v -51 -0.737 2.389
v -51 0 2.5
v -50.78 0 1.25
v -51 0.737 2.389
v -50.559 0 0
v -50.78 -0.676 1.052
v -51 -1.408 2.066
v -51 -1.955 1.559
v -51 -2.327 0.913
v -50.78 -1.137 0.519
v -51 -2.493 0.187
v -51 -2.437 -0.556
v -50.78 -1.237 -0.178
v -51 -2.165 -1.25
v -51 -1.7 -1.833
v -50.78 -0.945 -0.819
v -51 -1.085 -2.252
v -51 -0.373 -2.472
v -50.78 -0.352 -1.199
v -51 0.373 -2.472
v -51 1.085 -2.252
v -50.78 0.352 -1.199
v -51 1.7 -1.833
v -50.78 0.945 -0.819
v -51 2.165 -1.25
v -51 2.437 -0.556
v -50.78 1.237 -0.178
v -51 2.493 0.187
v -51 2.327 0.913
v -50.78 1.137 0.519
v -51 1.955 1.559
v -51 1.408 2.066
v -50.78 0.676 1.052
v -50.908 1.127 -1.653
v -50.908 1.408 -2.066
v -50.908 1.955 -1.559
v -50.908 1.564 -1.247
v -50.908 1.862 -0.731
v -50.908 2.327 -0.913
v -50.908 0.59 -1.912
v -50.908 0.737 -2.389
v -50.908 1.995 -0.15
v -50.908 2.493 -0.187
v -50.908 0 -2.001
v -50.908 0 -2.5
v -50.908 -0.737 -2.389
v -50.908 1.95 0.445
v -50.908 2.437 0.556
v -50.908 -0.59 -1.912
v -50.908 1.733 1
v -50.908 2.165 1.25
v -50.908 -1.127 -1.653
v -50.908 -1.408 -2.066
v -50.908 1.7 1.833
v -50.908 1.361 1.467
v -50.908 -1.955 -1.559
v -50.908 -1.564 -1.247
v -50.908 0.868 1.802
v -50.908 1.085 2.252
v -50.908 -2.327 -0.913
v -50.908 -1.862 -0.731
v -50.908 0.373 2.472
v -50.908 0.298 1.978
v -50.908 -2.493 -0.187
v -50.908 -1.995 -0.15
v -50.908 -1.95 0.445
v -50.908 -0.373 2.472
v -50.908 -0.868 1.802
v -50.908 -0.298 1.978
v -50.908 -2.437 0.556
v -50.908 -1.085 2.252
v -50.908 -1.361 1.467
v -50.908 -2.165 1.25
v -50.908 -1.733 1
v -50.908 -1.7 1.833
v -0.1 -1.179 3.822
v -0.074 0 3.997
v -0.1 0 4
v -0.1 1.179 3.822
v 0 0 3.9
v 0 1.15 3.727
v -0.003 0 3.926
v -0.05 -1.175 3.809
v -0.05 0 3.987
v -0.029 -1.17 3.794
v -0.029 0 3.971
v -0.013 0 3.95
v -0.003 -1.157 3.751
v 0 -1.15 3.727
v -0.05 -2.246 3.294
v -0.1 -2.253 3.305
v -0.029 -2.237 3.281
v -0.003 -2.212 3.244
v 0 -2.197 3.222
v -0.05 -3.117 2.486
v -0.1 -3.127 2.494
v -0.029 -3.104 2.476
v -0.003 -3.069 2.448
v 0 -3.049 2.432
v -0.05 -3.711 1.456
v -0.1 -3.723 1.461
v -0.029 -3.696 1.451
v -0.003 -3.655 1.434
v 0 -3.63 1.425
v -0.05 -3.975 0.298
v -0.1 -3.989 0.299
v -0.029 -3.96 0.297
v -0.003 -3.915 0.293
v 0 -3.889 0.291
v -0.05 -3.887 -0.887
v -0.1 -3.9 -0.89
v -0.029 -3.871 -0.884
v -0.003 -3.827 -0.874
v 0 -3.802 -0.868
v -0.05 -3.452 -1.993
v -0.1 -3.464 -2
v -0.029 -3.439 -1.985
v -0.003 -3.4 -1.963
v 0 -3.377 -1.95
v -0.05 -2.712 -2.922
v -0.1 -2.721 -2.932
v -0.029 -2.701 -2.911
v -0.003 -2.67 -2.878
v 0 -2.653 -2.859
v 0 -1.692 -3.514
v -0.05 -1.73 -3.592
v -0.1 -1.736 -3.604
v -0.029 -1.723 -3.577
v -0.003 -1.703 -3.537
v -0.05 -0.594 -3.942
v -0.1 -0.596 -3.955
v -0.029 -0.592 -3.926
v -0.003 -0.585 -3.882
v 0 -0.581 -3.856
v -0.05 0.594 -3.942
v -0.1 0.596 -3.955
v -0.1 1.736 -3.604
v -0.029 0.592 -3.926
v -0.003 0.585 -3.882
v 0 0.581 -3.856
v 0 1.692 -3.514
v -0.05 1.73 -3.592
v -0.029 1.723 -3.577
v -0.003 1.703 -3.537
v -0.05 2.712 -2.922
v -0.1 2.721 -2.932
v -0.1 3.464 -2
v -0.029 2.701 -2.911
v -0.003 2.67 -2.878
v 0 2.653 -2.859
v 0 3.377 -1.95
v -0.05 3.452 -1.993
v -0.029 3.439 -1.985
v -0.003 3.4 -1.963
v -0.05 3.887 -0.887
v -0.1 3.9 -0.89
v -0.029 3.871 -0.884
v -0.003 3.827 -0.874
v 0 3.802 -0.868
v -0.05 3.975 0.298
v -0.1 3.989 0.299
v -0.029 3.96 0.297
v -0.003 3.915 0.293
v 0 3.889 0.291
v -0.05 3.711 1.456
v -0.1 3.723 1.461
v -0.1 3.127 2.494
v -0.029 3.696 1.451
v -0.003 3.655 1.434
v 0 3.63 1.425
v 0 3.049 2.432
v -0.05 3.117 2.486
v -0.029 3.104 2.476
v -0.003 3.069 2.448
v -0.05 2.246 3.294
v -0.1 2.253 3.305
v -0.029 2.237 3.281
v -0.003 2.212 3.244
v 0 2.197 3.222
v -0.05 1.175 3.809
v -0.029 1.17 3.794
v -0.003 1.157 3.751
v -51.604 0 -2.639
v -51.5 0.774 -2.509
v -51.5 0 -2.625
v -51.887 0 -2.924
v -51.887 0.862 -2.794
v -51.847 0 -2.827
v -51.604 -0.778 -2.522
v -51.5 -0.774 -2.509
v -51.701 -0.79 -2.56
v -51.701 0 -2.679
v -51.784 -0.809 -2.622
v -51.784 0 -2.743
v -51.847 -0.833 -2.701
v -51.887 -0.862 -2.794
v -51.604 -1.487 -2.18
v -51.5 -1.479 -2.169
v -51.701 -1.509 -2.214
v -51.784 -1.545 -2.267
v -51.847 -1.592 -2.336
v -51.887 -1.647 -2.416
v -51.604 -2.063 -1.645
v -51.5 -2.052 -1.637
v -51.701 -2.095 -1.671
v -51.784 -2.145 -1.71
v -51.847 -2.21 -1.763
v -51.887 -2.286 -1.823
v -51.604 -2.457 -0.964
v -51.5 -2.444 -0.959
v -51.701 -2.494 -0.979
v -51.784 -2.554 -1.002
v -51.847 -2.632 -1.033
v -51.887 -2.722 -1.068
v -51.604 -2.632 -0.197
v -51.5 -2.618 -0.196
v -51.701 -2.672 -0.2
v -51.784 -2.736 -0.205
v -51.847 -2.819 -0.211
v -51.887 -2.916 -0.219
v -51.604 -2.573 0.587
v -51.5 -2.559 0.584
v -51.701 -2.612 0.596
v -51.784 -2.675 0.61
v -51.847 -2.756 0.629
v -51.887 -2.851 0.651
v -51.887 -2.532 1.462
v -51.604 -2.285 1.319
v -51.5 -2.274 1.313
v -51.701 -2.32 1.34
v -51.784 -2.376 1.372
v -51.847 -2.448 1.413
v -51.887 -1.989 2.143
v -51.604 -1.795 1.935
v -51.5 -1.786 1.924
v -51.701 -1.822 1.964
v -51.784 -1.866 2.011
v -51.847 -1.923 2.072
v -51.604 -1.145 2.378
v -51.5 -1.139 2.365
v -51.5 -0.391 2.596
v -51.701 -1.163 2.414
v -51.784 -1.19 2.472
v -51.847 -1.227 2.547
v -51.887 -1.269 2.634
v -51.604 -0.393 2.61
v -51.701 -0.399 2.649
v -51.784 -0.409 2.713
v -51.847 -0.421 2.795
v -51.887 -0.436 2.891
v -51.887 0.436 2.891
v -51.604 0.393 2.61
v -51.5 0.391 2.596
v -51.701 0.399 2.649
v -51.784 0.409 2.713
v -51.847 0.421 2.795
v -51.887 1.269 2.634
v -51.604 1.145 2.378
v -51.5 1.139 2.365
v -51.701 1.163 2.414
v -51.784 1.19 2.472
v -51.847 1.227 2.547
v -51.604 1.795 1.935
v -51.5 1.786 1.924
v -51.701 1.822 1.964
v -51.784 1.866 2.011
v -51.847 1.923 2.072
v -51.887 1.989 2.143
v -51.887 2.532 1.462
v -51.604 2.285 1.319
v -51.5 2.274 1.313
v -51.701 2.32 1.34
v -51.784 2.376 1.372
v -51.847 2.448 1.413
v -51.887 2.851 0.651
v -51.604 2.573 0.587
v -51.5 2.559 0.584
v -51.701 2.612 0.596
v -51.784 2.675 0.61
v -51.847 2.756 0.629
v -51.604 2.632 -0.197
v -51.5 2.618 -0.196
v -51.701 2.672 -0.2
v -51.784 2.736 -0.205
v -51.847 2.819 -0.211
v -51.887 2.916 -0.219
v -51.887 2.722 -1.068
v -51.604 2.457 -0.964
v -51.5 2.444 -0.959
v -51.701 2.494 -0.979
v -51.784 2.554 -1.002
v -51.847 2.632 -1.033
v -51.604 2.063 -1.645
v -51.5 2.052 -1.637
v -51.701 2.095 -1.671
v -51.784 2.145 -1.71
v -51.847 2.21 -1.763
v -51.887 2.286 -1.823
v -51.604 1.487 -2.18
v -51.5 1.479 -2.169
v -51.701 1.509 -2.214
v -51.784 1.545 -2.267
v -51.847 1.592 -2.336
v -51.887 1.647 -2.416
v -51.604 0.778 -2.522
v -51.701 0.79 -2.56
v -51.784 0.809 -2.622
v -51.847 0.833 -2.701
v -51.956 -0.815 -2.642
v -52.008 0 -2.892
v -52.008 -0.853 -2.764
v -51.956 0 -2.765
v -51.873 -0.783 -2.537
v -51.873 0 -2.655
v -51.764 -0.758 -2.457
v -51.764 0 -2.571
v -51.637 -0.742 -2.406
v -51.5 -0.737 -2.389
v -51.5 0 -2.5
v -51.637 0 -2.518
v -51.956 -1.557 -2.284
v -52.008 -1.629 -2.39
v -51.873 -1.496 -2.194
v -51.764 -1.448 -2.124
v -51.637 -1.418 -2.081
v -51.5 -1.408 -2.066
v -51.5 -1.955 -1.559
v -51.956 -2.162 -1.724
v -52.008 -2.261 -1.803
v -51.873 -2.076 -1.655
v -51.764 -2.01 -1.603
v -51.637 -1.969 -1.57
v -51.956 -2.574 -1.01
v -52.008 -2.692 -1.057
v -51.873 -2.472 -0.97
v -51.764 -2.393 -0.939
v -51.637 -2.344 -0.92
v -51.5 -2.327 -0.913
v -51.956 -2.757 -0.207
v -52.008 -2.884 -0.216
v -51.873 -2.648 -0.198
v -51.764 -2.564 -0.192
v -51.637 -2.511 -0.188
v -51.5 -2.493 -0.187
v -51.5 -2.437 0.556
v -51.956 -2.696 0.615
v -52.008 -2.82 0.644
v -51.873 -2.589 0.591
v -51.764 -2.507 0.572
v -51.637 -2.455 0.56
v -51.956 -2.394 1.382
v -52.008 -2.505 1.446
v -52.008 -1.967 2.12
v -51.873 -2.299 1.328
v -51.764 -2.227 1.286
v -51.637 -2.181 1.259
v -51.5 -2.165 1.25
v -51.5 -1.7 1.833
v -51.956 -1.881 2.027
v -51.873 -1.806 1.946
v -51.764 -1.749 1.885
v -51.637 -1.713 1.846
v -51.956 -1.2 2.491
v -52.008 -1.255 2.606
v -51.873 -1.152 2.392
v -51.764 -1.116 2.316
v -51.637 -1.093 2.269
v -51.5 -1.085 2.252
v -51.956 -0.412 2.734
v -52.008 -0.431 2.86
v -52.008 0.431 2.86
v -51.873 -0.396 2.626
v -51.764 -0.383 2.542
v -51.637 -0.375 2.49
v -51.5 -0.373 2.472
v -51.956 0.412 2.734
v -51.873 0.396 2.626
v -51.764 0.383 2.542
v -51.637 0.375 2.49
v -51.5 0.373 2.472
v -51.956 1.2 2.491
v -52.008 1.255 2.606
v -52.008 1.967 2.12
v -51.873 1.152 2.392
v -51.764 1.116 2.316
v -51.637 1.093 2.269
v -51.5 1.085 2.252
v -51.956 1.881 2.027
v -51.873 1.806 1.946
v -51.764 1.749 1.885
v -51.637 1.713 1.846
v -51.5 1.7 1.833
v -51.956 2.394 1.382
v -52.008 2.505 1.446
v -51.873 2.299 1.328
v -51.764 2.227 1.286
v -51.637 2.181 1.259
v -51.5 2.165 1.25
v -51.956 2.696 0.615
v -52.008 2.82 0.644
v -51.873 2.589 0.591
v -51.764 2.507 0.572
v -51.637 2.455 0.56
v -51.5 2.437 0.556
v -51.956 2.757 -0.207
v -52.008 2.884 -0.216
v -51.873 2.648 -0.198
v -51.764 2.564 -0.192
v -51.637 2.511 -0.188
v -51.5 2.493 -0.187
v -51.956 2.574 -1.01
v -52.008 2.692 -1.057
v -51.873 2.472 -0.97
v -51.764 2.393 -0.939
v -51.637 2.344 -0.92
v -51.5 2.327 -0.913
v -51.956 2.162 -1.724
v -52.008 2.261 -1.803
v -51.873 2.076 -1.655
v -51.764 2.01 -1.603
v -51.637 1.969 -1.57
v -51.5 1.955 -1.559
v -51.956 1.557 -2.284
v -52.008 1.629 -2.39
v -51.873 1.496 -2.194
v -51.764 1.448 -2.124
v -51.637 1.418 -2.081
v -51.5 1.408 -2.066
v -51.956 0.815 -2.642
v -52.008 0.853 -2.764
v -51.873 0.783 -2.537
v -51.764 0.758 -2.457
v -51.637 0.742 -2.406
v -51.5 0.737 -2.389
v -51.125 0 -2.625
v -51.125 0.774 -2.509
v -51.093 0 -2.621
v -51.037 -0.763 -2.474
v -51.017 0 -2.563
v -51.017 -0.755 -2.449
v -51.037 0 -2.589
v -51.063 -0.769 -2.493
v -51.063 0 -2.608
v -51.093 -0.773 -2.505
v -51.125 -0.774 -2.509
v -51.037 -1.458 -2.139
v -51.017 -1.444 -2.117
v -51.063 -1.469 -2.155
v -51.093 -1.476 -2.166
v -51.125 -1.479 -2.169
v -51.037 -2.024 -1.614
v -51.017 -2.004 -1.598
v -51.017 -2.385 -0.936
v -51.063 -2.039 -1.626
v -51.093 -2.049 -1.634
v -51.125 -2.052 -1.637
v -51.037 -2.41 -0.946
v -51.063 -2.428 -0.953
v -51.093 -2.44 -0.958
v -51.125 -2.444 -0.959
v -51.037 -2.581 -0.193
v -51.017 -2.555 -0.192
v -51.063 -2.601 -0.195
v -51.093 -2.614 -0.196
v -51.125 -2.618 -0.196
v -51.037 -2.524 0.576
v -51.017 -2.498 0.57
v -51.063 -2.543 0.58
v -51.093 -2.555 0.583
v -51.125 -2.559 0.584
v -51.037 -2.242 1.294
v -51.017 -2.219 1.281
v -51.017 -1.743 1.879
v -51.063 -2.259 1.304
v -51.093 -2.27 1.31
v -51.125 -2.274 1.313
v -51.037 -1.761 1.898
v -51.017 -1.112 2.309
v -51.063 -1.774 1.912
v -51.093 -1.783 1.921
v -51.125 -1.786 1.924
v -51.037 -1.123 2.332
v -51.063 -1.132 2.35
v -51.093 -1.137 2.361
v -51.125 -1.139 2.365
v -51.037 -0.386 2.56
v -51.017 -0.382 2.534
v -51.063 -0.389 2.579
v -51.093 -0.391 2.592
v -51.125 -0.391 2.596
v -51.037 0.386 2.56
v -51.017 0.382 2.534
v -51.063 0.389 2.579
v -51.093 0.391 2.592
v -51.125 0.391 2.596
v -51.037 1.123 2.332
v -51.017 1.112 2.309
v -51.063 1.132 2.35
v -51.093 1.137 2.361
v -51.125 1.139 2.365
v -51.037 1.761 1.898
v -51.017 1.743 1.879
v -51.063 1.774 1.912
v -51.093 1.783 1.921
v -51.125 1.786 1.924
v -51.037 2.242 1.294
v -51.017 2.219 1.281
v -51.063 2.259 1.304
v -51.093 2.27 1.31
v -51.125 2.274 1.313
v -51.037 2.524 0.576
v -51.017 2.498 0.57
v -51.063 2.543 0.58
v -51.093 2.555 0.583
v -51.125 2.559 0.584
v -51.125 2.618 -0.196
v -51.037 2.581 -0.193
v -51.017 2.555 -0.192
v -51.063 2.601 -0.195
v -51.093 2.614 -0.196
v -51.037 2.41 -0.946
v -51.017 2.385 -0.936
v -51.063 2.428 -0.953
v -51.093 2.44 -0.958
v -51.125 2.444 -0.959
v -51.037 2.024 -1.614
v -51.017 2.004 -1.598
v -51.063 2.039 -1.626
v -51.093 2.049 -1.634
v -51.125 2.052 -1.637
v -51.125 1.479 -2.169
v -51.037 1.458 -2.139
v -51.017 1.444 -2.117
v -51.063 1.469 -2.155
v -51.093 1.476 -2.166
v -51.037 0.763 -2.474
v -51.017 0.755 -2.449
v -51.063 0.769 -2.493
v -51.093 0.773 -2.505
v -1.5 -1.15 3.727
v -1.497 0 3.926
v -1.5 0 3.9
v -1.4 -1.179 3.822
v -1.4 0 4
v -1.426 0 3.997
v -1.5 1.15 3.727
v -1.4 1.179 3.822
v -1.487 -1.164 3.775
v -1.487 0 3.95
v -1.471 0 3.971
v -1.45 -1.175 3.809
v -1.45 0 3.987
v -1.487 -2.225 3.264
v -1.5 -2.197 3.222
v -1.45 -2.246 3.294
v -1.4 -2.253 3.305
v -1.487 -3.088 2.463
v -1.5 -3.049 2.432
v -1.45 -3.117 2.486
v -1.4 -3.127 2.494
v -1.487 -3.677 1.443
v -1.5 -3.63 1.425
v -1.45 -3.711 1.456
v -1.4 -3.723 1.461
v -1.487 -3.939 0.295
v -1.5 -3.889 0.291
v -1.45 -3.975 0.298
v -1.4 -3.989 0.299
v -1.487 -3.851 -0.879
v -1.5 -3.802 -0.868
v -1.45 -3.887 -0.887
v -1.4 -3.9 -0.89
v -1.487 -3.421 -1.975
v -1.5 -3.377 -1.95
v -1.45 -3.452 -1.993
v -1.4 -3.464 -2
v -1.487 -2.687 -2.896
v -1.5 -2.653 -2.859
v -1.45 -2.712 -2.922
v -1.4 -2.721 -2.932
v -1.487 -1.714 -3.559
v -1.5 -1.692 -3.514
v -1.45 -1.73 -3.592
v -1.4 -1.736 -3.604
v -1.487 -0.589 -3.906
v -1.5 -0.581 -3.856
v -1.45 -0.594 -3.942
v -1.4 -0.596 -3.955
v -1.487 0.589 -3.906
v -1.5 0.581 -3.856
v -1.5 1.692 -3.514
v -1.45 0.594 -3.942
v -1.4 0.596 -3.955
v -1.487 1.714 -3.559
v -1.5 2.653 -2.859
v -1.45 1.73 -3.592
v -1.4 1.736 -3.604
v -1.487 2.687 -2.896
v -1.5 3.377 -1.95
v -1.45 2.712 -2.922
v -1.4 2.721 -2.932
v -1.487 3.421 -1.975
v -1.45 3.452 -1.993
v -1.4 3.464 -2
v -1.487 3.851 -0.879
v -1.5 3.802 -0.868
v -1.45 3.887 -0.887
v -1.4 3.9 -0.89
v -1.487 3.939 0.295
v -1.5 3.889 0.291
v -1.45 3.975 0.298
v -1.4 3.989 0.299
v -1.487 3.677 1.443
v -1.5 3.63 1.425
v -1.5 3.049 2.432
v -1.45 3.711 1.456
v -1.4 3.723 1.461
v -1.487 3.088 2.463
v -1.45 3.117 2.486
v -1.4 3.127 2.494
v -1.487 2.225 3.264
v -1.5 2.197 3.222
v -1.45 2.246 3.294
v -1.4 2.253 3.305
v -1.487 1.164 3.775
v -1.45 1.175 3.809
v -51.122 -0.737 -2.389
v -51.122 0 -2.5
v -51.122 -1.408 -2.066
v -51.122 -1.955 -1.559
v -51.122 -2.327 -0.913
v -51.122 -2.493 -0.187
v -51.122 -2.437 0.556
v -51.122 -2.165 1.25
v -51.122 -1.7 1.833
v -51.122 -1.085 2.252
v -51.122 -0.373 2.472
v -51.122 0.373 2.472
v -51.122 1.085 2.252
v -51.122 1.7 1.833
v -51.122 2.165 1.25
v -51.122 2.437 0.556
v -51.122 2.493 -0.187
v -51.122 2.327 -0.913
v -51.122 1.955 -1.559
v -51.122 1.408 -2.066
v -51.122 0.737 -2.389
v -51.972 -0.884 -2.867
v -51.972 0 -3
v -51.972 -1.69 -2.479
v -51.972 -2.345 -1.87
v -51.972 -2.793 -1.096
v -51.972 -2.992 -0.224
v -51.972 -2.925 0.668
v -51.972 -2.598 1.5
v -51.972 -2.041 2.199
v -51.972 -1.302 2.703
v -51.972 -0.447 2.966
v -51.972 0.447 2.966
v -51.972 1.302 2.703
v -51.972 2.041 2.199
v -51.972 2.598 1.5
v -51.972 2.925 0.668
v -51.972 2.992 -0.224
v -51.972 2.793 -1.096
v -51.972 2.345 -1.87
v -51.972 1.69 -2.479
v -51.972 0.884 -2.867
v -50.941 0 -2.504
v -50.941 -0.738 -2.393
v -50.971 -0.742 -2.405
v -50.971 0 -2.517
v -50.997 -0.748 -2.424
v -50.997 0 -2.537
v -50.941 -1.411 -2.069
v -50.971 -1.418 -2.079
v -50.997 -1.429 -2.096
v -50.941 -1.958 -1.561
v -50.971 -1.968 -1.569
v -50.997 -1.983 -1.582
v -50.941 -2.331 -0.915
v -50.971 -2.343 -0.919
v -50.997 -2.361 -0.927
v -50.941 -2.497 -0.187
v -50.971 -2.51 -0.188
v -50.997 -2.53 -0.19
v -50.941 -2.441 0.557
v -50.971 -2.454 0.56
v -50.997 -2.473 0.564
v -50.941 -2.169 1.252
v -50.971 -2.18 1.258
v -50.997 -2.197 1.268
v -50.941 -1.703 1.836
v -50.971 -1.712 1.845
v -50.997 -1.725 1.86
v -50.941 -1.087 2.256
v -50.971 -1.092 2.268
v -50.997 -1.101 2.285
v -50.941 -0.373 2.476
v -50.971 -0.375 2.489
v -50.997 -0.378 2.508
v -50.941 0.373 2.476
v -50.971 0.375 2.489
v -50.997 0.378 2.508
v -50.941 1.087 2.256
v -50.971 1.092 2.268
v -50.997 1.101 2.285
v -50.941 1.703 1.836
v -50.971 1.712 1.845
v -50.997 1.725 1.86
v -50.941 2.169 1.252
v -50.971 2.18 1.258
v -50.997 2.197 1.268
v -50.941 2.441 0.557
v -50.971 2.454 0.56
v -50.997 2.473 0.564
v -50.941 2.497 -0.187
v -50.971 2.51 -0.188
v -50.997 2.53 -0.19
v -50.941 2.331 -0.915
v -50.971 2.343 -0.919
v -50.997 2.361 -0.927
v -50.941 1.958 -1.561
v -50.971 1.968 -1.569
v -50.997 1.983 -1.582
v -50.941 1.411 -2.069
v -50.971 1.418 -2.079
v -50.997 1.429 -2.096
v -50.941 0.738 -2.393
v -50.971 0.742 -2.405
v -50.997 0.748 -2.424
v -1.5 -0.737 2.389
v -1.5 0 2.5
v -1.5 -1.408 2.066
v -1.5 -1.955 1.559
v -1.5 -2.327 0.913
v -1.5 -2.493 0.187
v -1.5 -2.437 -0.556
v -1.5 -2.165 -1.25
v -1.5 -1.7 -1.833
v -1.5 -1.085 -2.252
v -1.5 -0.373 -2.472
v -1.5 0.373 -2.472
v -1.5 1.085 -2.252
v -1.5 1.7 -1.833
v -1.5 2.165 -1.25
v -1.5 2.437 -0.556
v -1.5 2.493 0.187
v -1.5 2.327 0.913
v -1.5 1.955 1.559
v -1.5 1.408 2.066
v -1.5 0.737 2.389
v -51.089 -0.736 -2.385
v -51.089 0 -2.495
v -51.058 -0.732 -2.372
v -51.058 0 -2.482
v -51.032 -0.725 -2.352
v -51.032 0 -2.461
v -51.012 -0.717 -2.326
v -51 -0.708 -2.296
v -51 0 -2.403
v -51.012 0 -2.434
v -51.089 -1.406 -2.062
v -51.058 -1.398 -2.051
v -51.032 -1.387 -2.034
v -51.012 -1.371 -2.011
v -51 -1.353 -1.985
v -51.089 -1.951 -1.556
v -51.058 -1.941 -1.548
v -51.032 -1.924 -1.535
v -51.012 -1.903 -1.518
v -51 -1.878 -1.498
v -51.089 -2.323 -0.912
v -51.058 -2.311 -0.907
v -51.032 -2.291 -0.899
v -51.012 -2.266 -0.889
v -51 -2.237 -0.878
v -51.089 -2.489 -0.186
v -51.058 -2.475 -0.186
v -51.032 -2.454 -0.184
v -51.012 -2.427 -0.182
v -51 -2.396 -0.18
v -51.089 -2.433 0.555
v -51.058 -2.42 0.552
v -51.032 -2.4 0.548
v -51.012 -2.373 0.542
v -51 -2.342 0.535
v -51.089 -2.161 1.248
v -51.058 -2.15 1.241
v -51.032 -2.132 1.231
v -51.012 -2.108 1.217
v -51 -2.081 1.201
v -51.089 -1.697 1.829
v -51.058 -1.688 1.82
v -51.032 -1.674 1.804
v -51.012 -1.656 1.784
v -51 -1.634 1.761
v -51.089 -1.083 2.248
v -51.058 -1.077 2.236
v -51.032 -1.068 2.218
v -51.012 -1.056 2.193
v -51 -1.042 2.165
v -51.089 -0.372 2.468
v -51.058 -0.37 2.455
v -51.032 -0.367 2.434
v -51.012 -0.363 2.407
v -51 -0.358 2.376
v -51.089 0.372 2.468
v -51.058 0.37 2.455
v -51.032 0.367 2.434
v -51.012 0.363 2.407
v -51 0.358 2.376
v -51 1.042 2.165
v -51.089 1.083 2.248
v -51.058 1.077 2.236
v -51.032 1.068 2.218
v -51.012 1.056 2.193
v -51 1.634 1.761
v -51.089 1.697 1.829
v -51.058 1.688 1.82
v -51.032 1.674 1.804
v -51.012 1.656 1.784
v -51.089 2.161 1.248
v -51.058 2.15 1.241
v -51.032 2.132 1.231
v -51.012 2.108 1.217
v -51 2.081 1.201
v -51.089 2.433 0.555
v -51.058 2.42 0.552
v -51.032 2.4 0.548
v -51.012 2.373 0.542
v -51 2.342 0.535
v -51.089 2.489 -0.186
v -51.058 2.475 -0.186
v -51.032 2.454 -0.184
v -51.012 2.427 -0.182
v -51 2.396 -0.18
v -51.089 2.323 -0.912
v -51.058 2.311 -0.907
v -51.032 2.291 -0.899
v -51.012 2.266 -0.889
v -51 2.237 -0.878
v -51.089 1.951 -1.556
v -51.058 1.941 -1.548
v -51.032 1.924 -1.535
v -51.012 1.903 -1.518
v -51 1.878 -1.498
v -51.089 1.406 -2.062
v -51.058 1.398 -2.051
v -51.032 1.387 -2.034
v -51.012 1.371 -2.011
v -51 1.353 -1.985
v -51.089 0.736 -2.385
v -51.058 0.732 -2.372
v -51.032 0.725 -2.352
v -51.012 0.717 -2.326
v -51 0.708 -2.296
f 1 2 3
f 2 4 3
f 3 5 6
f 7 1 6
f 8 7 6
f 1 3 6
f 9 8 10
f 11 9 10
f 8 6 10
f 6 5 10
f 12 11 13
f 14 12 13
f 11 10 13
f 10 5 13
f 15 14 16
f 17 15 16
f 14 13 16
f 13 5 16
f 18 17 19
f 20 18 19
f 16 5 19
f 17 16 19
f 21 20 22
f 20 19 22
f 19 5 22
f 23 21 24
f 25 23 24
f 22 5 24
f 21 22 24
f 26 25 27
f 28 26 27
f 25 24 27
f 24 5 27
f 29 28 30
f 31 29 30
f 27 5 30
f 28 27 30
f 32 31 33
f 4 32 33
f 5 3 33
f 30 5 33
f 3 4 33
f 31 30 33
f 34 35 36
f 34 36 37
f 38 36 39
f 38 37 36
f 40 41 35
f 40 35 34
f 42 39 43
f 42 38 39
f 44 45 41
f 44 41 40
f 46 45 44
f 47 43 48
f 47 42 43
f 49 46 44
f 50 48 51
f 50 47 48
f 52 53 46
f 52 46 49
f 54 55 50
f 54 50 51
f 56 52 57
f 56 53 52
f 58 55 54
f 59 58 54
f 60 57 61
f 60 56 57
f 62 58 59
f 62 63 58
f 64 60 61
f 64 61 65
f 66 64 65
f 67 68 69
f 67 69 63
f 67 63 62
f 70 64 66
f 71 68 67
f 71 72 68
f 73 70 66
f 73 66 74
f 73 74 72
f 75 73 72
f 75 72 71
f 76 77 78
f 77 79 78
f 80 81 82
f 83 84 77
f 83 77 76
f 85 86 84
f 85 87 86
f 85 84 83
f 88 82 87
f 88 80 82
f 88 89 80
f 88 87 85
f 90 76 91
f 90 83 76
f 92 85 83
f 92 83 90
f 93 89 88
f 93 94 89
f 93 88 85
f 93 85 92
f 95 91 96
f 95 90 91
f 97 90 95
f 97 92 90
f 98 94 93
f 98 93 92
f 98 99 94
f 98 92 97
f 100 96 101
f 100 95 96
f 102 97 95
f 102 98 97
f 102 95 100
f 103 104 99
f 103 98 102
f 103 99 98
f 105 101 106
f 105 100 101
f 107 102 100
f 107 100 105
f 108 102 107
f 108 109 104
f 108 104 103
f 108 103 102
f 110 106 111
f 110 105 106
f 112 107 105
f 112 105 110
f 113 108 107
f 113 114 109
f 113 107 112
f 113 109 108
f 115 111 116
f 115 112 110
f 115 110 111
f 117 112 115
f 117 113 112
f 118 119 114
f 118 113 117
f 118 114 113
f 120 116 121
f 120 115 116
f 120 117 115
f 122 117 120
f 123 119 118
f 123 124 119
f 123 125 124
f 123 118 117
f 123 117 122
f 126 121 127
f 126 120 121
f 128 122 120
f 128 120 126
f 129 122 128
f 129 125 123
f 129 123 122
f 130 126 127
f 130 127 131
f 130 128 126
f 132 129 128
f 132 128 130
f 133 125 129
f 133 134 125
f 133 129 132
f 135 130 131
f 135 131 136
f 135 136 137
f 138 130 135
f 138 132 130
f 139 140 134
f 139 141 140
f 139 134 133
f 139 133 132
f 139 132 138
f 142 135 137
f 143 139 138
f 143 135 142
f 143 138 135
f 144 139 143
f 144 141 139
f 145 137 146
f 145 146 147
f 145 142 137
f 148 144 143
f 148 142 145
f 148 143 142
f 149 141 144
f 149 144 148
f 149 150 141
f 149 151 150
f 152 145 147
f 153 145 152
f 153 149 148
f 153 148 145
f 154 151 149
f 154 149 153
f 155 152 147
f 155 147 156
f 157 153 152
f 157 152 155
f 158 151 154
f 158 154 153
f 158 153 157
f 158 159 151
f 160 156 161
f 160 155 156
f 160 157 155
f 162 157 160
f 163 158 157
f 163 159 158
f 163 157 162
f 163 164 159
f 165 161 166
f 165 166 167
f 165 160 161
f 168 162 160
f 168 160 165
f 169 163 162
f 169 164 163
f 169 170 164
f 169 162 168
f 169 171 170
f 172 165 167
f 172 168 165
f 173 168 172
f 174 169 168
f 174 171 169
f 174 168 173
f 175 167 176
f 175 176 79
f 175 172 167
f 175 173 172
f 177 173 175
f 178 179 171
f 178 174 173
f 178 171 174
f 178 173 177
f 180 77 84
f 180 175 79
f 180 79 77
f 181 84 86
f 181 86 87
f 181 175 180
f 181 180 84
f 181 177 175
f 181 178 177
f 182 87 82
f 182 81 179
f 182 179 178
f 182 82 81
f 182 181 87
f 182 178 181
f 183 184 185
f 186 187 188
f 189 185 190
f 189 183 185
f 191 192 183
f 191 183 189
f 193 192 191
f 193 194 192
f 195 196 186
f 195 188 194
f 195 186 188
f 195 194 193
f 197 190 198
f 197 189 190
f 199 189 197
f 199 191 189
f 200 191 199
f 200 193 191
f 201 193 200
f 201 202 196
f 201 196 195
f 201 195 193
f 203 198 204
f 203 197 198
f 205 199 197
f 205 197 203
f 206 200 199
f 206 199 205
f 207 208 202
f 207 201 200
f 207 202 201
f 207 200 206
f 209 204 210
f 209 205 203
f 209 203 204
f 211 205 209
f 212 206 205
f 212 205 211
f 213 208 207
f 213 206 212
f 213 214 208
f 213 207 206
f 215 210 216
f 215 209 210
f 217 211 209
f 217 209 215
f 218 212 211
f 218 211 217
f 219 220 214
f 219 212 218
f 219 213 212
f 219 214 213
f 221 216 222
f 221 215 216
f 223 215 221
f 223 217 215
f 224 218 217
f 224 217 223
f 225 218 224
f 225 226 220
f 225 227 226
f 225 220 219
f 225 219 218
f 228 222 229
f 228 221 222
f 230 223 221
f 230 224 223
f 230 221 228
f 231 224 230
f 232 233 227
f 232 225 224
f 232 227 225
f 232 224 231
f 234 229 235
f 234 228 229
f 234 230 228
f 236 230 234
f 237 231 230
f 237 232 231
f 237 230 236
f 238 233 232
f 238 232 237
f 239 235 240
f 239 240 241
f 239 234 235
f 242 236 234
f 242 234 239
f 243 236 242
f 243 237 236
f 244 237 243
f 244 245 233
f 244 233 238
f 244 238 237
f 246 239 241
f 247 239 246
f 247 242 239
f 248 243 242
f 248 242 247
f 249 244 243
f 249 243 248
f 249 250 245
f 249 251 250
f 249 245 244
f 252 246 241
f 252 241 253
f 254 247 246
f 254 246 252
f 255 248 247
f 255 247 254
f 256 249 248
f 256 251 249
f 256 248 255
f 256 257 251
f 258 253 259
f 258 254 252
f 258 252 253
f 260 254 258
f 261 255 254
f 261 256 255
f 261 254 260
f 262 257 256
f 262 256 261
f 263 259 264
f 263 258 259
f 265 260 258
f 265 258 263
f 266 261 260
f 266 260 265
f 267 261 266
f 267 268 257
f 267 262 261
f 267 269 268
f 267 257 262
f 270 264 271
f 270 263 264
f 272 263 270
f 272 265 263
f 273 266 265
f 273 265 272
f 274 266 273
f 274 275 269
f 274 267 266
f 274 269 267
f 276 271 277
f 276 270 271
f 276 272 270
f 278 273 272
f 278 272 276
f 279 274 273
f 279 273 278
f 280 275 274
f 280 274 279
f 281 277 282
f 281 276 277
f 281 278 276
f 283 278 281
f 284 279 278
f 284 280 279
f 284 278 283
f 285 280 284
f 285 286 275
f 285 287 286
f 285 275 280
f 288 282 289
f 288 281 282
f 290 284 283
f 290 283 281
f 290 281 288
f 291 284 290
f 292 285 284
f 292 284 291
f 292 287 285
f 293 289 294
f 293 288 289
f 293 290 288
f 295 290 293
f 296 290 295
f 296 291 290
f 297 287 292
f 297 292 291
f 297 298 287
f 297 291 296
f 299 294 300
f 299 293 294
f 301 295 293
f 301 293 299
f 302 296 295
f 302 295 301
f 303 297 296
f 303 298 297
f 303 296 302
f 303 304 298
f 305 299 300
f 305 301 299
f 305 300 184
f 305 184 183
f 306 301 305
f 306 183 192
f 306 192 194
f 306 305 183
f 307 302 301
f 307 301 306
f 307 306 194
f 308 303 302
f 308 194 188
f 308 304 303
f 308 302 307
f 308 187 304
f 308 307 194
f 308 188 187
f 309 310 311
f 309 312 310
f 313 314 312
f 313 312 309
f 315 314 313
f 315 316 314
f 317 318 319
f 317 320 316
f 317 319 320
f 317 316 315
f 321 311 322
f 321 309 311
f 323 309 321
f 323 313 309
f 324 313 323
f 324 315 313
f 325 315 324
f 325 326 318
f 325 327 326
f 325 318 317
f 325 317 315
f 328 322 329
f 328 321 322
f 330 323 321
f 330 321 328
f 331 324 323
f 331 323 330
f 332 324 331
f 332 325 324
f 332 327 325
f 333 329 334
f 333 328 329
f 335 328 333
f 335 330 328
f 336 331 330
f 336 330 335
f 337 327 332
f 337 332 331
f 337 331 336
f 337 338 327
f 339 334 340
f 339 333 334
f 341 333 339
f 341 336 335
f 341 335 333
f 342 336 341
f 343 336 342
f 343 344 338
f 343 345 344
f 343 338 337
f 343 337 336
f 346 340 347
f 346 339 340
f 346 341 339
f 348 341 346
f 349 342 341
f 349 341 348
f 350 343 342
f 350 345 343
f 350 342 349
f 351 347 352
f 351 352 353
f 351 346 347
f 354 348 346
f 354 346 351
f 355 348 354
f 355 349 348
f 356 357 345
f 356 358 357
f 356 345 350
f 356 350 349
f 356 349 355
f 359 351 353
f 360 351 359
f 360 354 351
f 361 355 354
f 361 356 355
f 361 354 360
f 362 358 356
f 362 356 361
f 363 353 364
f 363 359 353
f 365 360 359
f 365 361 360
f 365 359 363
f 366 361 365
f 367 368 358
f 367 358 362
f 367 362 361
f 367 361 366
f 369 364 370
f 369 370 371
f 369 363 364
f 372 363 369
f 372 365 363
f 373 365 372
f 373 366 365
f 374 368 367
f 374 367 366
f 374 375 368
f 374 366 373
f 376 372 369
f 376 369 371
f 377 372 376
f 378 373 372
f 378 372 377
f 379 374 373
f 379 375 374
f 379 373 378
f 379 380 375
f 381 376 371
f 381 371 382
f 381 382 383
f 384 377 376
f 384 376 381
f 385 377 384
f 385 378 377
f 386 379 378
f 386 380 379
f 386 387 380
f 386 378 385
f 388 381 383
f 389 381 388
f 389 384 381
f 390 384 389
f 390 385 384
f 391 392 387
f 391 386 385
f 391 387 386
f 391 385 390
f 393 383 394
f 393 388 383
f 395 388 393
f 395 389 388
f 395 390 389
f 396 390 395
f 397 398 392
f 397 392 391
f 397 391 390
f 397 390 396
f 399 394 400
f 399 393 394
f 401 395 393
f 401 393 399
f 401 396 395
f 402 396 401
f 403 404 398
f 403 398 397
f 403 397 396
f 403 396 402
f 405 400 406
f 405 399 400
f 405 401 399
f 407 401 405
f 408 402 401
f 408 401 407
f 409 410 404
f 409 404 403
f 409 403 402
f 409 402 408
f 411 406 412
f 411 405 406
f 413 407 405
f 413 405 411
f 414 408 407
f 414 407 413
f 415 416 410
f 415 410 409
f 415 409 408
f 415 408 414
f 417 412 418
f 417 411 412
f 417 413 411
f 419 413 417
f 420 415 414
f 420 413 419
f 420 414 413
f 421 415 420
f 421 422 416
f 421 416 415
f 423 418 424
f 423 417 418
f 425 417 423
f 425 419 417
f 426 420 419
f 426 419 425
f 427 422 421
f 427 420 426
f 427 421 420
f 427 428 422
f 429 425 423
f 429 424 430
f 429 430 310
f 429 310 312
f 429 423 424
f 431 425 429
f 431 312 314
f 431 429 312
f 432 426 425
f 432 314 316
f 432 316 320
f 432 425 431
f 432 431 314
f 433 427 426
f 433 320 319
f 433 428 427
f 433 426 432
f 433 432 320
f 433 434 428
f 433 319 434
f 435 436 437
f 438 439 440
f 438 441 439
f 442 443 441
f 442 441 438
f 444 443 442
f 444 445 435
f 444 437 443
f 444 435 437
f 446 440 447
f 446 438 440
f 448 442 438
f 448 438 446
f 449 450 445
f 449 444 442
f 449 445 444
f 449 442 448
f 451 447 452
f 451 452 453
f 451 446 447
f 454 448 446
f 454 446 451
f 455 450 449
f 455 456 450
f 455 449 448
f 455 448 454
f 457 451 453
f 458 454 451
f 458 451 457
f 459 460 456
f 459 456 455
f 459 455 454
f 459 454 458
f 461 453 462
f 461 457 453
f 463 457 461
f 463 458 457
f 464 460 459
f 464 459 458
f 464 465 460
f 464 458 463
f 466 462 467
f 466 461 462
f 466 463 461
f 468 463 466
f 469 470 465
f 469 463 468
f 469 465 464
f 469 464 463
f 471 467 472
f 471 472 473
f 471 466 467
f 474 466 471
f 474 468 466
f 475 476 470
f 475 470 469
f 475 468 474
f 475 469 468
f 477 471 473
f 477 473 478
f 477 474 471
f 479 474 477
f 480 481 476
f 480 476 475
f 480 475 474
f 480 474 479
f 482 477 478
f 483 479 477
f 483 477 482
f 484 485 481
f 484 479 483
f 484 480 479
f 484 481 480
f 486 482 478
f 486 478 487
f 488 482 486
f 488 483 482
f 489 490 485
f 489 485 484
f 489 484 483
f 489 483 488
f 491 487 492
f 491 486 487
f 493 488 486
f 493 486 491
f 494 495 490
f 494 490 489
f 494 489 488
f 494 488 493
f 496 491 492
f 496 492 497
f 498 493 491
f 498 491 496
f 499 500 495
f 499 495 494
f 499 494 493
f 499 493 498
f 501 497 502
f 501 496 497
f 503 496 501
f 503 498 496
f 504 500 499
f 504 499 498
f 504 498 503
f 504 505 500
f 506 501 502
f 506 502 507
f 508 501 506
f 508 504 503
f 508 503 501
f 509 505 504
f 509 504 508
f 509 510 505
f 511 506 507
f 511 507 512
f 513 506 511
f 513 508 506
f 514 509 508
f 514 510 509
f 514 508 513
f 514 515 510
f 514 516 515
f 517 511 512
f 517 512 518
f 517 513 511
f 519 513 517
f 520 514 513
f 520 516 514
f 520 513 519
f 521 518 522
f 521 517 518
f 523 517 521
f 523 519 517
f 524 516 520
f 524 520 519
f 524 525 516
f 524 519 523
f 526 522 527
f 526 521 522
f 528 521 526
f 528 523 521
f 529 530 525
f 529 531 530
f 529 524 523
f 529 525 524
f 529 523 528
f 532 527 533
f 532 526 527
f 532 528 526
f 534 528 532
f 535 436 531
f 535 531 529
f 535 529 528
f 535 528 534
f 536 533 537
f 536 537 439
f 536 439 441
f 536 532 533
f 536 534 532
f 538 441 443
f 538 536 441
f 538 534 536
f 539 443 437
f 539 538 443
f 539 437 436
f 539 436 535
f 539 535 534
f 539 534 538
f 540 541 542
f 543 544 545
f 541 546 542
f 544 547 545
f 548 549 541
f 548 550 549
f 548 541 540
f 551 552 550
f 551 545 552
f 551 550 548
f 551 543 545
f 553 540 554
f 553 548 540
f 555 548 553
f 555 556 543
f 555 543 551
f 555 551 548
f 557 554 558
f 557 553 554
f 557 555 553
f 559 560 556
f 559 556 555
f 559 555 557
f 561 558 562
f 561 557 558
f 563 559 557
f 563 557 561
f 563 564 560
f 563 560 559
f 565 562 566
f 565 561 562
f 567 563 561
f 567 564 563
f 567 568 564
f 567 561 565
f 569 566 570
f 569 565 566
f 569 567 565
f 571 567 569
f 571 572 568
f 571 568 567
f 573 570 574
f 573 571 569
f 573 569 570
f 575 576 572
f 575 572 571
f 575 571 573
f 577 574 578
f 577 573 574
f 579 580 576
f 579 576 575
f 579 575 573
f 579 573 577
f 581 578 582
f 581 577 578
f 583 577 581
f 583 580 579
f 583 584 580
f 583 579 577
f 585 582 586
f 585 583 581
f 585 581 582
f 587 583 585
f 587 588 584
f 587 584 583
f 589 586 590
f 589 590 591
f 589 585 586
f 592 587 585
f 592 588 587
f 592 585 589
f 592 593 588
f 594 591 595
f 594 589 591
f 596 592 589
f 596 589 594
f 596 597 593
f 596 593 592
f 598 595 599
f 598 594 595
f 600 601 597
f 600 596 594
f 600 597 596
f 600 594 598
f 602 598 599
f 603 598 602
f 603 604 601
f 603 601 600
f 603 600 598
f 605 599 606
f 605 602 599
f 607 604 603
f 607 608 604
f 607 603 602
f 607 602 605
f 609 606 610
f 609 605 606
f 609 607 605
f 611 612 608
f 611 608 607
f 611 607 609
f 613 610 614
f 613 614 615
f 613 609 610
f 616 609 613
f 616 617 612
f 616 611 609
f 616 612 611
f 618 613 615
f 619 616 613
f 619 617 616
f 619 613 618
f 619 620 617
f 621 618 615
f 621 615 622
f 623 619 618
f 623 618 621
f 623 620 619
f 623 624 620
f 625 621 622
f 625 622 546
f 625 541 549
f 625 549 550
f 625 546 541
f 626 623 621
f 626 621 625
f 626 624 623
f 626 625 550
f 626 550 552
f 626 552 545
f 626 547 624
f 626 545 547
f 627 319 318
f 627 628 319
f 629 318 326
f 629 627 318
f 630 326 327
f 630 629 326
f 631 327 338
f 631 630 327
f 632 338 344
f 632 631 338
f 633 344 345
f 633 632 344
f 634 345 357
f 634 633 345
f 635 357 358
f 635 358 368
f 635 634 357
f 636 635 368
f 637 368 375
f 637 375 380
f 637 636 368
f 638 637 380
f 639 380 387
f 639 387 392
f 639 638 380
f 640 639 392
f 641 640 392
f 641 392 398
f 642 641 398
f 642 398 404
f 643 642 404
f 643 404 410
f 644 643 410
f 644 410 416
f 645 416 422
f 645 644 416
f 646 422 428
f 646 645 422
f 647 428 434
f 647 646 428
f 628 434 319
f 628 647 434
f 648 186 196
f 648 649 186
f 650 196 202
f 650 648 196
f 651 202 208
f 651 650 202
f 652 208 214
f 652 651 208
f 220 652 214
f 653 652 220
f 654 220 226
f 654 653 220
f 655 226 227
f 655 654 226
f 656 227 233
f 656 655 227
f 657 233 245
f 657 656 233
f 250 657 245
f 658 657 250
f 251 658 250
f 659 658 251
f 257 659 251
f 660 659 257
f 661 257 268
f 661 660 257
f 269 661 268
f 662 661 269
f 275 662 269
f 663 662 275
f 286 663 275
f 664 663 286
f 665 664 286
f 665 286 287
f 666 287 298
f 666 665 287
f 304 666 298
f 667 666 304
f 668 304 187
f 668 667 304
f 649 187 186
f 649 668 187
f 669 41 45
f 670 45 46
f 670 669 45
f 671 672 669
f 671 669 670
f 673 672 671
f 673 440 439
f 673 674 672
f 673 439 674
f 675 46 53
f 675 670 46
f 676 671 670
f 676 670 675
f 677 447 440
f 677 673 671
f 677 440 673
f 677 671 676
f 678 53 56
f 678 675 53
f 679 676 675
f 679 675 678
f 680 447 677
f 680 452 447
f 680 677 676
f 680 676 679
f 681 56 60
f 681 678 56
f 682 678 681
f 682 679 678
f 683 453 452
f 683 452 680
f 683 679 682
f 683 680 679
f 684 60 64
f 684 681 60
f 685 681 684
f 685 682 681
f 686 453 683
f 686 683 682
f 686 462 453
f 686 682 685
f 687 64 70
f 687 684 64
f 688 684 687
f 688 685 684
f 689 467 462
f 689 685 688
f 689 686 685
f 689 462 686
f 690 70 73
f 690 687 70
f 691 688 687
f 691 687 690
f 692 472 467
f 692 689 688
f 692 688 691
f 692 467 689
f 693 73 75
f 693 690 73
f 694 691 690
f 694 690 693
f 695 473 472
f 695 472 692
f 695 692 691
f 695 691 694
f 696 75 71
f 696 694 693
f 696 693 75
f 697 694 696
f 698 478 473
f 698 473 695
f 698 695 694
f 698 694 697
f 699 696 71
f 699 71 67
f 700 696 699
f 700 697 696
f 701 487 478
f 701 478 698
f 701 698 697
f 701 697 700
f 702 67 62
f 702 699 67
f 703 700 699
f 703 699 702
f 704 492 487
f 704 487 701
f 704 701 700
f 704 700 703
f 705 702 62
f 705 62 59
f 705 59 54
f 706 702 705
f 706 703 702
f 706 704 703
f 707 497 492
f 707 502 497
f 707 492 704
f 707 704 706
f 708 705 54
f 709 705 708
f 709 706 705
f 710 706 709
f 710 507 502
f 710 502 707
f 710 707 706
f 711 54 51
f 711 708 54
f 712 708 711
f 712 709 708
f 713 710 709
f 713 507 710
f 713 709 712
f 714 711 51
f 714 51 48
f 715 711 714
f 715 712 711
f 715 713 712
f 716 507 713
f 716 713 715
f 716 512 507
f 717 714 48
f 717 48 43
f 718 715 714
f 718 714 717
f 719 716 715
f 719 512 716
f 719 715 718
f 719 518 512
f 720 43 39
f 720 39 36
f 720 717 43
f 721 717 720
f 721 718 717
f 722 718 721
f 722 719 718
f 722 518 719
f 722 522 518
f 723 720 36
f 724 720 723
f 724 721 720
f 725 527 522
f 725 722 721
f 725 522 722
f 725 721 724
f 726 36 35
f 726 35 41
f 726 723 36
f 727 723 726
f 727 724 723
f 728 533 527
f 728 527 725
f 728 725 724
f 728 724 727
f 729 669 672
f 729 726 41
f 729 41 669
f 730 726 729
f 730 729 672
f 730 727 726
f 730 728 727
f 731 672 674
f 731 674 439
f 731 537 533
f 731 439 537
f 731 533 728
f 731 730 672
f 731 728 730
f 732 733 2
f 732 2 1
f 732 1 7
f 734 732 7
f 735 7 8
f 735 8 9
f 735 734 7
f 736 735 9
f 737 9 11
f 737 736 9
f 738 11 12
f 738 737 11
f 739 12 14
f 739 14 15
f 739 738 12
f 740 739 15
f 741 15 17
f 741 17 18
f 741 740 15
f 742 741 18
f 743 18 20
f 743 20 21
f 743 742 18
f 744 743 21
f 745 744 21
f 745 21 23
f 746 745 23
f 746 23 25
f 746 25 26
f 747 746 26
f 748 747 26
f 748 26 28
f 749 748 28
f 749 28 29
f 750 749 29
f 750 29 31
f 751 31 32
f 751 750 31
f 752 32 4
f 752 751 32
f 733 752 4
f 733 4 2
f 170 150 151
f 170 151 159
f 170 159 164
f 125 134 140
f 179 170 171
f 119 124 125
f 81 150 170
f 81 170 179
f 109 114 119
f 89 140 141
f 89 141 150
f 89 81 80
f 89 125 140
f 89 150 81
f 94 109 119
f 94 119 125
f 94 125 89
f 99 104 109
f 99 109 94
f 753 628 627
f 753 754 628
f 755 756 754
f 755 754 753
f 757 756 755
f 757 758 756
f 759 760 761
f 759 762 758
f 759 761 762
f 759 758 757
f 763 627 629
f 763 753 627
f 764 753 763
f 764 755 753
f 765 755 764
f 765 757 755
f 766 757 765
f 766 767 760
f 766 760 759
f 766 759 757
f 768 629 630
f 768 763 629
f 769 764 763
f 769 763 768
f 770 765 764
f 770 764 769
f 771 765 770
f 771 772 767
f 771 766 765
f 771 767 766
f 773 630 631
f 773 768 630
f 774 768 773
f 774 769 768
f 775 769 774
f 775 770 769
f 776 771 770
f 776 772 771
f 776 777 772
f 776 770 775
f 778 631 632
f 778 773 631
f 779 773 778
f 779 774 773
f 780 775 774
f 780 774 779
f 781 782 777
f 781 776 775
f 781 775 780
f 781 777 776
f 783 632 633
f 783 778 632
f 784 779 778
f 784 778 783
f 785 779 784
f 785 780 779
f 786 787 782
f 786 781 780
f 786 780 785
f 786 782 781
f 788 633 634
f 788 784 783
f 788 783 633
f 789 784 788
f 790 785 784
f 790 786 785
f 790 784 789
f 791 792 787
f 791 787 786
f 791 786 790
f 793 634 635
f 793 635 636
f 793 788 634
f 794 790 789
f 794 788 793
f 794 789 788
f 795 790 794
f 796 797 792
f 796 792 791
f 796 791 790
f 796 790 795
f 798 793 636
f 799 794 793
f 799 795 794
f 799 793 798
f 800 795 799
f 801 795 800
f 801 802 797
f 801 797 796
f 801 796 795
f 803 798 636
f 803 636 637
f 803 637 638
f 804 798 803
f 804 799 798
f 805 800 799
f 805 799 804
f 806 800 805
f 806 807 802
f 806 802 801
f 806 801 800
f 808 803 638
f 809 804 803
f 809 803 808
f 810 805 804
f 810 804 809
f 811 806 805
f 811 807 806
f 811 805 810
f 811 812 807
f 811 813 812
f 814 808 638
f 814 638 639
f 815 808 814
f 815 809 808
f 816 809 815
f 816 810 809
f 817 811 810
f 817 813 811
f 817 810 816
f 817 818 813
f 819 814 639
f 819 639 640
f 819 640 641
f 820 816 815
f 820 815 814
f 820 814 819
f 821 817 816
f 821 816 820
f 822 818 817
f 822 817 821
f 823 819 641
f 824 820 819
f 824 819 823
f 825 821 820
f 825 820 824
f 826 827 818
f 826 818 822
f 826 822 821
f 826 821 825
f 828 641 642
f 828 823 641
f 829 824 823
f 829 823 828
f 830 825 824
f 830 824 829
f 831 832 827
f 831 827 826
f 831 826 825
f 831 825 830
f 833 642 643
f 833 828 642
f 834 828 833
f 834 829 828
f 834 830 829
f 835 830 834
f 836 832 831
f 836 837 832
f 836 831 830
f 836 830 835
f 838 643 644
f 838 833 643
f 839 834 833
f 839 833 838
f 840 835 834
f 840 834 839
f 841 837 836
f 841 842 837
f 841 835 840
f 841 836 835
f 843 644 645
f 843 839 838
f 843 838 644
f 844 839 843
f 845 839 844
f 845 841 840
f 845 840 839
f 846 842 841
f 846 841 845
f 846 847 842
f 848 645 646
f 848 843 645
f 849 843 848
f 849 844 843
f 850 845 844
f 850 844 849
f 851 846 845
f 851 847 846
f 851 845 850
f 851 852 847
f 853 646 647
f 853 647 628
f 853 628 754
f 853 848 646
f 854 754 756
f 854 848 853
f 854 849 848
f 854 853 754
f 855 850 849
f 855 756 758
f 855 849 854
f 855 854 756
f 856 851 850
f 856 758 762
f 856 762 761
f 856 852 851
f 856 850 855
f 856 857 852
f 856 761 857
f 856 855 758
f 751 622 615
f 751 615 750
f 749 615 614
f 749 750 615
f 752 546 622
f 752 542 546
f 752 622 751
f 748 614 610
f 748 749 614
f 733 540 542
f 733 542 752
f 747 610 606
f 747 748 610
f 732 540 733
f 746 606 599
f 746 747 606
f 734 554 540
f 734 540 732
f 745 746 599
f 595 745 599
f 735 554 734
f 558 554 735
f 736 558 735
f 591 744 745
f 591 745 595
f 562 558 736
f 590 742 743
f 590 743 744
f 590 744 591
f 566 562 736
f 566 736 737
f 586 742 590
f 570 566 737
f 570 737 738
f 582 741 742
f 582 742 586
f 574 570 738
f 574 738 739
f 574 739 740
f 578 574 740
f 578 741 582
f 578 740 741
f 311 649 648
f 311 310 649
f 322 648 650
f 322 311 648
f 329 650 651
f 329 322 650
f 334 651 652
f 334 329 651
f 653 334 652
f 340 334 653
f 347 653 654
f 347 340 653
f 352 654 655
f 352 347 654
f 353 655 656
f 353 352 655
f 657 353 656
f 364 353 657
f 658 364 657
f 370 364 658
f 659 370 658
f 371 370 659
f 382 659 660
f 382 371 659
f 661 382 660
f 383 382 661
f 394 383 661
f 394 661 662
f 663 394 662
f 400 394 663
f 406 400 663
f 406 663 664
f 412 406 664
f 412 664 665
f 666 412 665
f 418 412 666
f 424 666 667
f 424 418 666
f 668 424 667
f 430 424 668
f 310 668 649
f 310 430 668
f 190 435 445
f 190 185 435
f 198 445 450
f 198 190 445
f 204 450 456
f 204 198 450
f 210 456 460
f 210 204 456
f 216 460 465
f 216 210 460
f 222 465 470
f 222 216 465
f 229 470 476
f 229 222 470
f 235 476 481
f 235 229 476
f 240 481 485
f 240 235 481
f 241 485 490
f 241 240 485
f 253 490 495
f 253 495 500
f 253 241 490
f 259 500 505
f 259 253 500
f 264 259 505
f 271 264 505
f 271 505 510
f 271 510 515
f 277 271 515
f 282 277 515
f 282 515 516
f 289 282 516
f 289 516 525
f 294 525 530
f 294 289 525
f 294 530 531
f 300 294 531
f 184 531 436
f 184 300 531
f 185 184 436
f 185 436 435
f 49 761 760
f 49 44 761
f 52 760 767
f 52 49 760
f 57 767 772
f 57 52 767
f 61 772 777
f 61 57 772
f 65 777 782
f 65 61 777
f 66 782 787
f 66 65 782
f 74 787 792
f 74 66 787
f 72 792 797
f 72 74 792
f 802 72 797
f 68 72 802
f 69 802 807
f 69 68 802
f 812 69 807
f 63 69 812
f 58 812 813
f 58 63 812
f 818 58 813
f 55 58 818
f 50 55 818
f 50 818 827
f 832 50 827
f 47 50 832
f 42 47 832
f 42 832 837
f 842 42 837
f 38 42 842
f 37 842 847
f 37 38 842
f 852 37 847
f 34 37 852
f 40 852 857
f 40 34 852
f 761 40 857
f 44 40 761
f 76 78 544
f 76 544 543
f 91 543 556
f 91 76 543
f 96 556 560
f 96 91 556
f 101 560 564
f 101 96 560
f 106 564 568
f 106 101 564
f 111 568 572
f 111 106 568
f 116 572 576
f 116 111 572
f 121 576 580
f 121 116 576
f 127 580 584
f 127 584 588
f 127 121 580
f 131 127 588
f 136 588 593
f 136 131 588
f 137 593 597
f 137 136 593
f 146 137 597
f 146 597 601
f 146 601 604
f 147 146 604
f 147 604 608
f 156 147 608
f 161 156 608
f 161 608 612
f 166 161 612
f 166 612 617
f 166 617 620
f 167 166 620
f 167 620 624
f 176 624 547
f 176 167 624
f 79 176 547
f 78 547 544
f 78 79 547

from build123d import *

# Parameters (mm, degrees)
RADYUS1_R = 0.1


with BuildPart() as part:
    # Çizim1 → Döndür1 (revolve)
    with BuildSketch(Plane.XY):
        Polygon((0, 0), (-51, 0), (-51, 2.5), (-1.5, 2.5), (-1.5, 4), (0, 4), align=None)
    revolve(axis=Axis((0, 0, 0), (1, 0, 0)))

    # Radyus1
    radyus1_edges = [part.edges().sort_by_distance(p)[0] for p in [
        (0, -4, 0),
        (-1.5, -4, 0),
    ]]
    fillet(radyus1_edges, radius=RADYUS1_R)

    # Kes-Ekstrüzyon1 cone 1 section (through the dimple's axis) → Kes-Ekstrüzyon1 (revolve, cut)
    with BuildSketch(Plane(origin=(-51, 0, 0), x_dir=(0, 0, 1), z_dir=(0, 1, 0))):
        Polygon((0, 0), (2.5, 0), (0, 0.440817452), align=None)
    revolve(axis=Axis((-51, 0, 0), (1, 0, 0)), mode=Mode.SUBTRACT)


with BuildPart() as body_2:
    # Çizim4 → Döndür2 (revolve)
    with BuildSketch(Plane.XY):
        with BuildLine():
            Line((-51.5, 2.5), (-51.122086007, 2.5))
            ThreePointArc((-51.122086007, 2.5), (-51.044002307, 2.472672569), (-51, 2.402617949))
            Line((-51, 2.402617949), (-50.908332988, 2.000595733))
            Line((-50.908332988, 2.000595733), (-50.908332988, 2.5))
            ThreePointArc((-50.908332988, 2.5), (-50.970942722, 2.516776227), (-51.016776227, 2.562609733))
            ThreePointArc((-51.016776227, 2.562609733), (-51.062609733, 2.608443239), (-51.125219467, 2.625219467))
            Line((-51.125219467, 2.625219467), (-51.5, 2.625219467))
            ThreePointArc((-51.5, 2.625219467), (-51.744473143, 2.708623695), (-51.886995816, 2.924055054))
            Line((-51.886995816, 2.924055054), (-51.971562154, 3))
            Line((-51.971562154, 3), (-52.00814434, 2.89238567))
            ThreePointArc((-52.00814434, 2.89238567), (-51.821005134, 2.609513811), (-51.5, 2.5))
        make_face()
    revolve(axis=Axis((-51, 0, 0), (-1, 0, 0)))


solid = Compound([part.part, body_2.part])
